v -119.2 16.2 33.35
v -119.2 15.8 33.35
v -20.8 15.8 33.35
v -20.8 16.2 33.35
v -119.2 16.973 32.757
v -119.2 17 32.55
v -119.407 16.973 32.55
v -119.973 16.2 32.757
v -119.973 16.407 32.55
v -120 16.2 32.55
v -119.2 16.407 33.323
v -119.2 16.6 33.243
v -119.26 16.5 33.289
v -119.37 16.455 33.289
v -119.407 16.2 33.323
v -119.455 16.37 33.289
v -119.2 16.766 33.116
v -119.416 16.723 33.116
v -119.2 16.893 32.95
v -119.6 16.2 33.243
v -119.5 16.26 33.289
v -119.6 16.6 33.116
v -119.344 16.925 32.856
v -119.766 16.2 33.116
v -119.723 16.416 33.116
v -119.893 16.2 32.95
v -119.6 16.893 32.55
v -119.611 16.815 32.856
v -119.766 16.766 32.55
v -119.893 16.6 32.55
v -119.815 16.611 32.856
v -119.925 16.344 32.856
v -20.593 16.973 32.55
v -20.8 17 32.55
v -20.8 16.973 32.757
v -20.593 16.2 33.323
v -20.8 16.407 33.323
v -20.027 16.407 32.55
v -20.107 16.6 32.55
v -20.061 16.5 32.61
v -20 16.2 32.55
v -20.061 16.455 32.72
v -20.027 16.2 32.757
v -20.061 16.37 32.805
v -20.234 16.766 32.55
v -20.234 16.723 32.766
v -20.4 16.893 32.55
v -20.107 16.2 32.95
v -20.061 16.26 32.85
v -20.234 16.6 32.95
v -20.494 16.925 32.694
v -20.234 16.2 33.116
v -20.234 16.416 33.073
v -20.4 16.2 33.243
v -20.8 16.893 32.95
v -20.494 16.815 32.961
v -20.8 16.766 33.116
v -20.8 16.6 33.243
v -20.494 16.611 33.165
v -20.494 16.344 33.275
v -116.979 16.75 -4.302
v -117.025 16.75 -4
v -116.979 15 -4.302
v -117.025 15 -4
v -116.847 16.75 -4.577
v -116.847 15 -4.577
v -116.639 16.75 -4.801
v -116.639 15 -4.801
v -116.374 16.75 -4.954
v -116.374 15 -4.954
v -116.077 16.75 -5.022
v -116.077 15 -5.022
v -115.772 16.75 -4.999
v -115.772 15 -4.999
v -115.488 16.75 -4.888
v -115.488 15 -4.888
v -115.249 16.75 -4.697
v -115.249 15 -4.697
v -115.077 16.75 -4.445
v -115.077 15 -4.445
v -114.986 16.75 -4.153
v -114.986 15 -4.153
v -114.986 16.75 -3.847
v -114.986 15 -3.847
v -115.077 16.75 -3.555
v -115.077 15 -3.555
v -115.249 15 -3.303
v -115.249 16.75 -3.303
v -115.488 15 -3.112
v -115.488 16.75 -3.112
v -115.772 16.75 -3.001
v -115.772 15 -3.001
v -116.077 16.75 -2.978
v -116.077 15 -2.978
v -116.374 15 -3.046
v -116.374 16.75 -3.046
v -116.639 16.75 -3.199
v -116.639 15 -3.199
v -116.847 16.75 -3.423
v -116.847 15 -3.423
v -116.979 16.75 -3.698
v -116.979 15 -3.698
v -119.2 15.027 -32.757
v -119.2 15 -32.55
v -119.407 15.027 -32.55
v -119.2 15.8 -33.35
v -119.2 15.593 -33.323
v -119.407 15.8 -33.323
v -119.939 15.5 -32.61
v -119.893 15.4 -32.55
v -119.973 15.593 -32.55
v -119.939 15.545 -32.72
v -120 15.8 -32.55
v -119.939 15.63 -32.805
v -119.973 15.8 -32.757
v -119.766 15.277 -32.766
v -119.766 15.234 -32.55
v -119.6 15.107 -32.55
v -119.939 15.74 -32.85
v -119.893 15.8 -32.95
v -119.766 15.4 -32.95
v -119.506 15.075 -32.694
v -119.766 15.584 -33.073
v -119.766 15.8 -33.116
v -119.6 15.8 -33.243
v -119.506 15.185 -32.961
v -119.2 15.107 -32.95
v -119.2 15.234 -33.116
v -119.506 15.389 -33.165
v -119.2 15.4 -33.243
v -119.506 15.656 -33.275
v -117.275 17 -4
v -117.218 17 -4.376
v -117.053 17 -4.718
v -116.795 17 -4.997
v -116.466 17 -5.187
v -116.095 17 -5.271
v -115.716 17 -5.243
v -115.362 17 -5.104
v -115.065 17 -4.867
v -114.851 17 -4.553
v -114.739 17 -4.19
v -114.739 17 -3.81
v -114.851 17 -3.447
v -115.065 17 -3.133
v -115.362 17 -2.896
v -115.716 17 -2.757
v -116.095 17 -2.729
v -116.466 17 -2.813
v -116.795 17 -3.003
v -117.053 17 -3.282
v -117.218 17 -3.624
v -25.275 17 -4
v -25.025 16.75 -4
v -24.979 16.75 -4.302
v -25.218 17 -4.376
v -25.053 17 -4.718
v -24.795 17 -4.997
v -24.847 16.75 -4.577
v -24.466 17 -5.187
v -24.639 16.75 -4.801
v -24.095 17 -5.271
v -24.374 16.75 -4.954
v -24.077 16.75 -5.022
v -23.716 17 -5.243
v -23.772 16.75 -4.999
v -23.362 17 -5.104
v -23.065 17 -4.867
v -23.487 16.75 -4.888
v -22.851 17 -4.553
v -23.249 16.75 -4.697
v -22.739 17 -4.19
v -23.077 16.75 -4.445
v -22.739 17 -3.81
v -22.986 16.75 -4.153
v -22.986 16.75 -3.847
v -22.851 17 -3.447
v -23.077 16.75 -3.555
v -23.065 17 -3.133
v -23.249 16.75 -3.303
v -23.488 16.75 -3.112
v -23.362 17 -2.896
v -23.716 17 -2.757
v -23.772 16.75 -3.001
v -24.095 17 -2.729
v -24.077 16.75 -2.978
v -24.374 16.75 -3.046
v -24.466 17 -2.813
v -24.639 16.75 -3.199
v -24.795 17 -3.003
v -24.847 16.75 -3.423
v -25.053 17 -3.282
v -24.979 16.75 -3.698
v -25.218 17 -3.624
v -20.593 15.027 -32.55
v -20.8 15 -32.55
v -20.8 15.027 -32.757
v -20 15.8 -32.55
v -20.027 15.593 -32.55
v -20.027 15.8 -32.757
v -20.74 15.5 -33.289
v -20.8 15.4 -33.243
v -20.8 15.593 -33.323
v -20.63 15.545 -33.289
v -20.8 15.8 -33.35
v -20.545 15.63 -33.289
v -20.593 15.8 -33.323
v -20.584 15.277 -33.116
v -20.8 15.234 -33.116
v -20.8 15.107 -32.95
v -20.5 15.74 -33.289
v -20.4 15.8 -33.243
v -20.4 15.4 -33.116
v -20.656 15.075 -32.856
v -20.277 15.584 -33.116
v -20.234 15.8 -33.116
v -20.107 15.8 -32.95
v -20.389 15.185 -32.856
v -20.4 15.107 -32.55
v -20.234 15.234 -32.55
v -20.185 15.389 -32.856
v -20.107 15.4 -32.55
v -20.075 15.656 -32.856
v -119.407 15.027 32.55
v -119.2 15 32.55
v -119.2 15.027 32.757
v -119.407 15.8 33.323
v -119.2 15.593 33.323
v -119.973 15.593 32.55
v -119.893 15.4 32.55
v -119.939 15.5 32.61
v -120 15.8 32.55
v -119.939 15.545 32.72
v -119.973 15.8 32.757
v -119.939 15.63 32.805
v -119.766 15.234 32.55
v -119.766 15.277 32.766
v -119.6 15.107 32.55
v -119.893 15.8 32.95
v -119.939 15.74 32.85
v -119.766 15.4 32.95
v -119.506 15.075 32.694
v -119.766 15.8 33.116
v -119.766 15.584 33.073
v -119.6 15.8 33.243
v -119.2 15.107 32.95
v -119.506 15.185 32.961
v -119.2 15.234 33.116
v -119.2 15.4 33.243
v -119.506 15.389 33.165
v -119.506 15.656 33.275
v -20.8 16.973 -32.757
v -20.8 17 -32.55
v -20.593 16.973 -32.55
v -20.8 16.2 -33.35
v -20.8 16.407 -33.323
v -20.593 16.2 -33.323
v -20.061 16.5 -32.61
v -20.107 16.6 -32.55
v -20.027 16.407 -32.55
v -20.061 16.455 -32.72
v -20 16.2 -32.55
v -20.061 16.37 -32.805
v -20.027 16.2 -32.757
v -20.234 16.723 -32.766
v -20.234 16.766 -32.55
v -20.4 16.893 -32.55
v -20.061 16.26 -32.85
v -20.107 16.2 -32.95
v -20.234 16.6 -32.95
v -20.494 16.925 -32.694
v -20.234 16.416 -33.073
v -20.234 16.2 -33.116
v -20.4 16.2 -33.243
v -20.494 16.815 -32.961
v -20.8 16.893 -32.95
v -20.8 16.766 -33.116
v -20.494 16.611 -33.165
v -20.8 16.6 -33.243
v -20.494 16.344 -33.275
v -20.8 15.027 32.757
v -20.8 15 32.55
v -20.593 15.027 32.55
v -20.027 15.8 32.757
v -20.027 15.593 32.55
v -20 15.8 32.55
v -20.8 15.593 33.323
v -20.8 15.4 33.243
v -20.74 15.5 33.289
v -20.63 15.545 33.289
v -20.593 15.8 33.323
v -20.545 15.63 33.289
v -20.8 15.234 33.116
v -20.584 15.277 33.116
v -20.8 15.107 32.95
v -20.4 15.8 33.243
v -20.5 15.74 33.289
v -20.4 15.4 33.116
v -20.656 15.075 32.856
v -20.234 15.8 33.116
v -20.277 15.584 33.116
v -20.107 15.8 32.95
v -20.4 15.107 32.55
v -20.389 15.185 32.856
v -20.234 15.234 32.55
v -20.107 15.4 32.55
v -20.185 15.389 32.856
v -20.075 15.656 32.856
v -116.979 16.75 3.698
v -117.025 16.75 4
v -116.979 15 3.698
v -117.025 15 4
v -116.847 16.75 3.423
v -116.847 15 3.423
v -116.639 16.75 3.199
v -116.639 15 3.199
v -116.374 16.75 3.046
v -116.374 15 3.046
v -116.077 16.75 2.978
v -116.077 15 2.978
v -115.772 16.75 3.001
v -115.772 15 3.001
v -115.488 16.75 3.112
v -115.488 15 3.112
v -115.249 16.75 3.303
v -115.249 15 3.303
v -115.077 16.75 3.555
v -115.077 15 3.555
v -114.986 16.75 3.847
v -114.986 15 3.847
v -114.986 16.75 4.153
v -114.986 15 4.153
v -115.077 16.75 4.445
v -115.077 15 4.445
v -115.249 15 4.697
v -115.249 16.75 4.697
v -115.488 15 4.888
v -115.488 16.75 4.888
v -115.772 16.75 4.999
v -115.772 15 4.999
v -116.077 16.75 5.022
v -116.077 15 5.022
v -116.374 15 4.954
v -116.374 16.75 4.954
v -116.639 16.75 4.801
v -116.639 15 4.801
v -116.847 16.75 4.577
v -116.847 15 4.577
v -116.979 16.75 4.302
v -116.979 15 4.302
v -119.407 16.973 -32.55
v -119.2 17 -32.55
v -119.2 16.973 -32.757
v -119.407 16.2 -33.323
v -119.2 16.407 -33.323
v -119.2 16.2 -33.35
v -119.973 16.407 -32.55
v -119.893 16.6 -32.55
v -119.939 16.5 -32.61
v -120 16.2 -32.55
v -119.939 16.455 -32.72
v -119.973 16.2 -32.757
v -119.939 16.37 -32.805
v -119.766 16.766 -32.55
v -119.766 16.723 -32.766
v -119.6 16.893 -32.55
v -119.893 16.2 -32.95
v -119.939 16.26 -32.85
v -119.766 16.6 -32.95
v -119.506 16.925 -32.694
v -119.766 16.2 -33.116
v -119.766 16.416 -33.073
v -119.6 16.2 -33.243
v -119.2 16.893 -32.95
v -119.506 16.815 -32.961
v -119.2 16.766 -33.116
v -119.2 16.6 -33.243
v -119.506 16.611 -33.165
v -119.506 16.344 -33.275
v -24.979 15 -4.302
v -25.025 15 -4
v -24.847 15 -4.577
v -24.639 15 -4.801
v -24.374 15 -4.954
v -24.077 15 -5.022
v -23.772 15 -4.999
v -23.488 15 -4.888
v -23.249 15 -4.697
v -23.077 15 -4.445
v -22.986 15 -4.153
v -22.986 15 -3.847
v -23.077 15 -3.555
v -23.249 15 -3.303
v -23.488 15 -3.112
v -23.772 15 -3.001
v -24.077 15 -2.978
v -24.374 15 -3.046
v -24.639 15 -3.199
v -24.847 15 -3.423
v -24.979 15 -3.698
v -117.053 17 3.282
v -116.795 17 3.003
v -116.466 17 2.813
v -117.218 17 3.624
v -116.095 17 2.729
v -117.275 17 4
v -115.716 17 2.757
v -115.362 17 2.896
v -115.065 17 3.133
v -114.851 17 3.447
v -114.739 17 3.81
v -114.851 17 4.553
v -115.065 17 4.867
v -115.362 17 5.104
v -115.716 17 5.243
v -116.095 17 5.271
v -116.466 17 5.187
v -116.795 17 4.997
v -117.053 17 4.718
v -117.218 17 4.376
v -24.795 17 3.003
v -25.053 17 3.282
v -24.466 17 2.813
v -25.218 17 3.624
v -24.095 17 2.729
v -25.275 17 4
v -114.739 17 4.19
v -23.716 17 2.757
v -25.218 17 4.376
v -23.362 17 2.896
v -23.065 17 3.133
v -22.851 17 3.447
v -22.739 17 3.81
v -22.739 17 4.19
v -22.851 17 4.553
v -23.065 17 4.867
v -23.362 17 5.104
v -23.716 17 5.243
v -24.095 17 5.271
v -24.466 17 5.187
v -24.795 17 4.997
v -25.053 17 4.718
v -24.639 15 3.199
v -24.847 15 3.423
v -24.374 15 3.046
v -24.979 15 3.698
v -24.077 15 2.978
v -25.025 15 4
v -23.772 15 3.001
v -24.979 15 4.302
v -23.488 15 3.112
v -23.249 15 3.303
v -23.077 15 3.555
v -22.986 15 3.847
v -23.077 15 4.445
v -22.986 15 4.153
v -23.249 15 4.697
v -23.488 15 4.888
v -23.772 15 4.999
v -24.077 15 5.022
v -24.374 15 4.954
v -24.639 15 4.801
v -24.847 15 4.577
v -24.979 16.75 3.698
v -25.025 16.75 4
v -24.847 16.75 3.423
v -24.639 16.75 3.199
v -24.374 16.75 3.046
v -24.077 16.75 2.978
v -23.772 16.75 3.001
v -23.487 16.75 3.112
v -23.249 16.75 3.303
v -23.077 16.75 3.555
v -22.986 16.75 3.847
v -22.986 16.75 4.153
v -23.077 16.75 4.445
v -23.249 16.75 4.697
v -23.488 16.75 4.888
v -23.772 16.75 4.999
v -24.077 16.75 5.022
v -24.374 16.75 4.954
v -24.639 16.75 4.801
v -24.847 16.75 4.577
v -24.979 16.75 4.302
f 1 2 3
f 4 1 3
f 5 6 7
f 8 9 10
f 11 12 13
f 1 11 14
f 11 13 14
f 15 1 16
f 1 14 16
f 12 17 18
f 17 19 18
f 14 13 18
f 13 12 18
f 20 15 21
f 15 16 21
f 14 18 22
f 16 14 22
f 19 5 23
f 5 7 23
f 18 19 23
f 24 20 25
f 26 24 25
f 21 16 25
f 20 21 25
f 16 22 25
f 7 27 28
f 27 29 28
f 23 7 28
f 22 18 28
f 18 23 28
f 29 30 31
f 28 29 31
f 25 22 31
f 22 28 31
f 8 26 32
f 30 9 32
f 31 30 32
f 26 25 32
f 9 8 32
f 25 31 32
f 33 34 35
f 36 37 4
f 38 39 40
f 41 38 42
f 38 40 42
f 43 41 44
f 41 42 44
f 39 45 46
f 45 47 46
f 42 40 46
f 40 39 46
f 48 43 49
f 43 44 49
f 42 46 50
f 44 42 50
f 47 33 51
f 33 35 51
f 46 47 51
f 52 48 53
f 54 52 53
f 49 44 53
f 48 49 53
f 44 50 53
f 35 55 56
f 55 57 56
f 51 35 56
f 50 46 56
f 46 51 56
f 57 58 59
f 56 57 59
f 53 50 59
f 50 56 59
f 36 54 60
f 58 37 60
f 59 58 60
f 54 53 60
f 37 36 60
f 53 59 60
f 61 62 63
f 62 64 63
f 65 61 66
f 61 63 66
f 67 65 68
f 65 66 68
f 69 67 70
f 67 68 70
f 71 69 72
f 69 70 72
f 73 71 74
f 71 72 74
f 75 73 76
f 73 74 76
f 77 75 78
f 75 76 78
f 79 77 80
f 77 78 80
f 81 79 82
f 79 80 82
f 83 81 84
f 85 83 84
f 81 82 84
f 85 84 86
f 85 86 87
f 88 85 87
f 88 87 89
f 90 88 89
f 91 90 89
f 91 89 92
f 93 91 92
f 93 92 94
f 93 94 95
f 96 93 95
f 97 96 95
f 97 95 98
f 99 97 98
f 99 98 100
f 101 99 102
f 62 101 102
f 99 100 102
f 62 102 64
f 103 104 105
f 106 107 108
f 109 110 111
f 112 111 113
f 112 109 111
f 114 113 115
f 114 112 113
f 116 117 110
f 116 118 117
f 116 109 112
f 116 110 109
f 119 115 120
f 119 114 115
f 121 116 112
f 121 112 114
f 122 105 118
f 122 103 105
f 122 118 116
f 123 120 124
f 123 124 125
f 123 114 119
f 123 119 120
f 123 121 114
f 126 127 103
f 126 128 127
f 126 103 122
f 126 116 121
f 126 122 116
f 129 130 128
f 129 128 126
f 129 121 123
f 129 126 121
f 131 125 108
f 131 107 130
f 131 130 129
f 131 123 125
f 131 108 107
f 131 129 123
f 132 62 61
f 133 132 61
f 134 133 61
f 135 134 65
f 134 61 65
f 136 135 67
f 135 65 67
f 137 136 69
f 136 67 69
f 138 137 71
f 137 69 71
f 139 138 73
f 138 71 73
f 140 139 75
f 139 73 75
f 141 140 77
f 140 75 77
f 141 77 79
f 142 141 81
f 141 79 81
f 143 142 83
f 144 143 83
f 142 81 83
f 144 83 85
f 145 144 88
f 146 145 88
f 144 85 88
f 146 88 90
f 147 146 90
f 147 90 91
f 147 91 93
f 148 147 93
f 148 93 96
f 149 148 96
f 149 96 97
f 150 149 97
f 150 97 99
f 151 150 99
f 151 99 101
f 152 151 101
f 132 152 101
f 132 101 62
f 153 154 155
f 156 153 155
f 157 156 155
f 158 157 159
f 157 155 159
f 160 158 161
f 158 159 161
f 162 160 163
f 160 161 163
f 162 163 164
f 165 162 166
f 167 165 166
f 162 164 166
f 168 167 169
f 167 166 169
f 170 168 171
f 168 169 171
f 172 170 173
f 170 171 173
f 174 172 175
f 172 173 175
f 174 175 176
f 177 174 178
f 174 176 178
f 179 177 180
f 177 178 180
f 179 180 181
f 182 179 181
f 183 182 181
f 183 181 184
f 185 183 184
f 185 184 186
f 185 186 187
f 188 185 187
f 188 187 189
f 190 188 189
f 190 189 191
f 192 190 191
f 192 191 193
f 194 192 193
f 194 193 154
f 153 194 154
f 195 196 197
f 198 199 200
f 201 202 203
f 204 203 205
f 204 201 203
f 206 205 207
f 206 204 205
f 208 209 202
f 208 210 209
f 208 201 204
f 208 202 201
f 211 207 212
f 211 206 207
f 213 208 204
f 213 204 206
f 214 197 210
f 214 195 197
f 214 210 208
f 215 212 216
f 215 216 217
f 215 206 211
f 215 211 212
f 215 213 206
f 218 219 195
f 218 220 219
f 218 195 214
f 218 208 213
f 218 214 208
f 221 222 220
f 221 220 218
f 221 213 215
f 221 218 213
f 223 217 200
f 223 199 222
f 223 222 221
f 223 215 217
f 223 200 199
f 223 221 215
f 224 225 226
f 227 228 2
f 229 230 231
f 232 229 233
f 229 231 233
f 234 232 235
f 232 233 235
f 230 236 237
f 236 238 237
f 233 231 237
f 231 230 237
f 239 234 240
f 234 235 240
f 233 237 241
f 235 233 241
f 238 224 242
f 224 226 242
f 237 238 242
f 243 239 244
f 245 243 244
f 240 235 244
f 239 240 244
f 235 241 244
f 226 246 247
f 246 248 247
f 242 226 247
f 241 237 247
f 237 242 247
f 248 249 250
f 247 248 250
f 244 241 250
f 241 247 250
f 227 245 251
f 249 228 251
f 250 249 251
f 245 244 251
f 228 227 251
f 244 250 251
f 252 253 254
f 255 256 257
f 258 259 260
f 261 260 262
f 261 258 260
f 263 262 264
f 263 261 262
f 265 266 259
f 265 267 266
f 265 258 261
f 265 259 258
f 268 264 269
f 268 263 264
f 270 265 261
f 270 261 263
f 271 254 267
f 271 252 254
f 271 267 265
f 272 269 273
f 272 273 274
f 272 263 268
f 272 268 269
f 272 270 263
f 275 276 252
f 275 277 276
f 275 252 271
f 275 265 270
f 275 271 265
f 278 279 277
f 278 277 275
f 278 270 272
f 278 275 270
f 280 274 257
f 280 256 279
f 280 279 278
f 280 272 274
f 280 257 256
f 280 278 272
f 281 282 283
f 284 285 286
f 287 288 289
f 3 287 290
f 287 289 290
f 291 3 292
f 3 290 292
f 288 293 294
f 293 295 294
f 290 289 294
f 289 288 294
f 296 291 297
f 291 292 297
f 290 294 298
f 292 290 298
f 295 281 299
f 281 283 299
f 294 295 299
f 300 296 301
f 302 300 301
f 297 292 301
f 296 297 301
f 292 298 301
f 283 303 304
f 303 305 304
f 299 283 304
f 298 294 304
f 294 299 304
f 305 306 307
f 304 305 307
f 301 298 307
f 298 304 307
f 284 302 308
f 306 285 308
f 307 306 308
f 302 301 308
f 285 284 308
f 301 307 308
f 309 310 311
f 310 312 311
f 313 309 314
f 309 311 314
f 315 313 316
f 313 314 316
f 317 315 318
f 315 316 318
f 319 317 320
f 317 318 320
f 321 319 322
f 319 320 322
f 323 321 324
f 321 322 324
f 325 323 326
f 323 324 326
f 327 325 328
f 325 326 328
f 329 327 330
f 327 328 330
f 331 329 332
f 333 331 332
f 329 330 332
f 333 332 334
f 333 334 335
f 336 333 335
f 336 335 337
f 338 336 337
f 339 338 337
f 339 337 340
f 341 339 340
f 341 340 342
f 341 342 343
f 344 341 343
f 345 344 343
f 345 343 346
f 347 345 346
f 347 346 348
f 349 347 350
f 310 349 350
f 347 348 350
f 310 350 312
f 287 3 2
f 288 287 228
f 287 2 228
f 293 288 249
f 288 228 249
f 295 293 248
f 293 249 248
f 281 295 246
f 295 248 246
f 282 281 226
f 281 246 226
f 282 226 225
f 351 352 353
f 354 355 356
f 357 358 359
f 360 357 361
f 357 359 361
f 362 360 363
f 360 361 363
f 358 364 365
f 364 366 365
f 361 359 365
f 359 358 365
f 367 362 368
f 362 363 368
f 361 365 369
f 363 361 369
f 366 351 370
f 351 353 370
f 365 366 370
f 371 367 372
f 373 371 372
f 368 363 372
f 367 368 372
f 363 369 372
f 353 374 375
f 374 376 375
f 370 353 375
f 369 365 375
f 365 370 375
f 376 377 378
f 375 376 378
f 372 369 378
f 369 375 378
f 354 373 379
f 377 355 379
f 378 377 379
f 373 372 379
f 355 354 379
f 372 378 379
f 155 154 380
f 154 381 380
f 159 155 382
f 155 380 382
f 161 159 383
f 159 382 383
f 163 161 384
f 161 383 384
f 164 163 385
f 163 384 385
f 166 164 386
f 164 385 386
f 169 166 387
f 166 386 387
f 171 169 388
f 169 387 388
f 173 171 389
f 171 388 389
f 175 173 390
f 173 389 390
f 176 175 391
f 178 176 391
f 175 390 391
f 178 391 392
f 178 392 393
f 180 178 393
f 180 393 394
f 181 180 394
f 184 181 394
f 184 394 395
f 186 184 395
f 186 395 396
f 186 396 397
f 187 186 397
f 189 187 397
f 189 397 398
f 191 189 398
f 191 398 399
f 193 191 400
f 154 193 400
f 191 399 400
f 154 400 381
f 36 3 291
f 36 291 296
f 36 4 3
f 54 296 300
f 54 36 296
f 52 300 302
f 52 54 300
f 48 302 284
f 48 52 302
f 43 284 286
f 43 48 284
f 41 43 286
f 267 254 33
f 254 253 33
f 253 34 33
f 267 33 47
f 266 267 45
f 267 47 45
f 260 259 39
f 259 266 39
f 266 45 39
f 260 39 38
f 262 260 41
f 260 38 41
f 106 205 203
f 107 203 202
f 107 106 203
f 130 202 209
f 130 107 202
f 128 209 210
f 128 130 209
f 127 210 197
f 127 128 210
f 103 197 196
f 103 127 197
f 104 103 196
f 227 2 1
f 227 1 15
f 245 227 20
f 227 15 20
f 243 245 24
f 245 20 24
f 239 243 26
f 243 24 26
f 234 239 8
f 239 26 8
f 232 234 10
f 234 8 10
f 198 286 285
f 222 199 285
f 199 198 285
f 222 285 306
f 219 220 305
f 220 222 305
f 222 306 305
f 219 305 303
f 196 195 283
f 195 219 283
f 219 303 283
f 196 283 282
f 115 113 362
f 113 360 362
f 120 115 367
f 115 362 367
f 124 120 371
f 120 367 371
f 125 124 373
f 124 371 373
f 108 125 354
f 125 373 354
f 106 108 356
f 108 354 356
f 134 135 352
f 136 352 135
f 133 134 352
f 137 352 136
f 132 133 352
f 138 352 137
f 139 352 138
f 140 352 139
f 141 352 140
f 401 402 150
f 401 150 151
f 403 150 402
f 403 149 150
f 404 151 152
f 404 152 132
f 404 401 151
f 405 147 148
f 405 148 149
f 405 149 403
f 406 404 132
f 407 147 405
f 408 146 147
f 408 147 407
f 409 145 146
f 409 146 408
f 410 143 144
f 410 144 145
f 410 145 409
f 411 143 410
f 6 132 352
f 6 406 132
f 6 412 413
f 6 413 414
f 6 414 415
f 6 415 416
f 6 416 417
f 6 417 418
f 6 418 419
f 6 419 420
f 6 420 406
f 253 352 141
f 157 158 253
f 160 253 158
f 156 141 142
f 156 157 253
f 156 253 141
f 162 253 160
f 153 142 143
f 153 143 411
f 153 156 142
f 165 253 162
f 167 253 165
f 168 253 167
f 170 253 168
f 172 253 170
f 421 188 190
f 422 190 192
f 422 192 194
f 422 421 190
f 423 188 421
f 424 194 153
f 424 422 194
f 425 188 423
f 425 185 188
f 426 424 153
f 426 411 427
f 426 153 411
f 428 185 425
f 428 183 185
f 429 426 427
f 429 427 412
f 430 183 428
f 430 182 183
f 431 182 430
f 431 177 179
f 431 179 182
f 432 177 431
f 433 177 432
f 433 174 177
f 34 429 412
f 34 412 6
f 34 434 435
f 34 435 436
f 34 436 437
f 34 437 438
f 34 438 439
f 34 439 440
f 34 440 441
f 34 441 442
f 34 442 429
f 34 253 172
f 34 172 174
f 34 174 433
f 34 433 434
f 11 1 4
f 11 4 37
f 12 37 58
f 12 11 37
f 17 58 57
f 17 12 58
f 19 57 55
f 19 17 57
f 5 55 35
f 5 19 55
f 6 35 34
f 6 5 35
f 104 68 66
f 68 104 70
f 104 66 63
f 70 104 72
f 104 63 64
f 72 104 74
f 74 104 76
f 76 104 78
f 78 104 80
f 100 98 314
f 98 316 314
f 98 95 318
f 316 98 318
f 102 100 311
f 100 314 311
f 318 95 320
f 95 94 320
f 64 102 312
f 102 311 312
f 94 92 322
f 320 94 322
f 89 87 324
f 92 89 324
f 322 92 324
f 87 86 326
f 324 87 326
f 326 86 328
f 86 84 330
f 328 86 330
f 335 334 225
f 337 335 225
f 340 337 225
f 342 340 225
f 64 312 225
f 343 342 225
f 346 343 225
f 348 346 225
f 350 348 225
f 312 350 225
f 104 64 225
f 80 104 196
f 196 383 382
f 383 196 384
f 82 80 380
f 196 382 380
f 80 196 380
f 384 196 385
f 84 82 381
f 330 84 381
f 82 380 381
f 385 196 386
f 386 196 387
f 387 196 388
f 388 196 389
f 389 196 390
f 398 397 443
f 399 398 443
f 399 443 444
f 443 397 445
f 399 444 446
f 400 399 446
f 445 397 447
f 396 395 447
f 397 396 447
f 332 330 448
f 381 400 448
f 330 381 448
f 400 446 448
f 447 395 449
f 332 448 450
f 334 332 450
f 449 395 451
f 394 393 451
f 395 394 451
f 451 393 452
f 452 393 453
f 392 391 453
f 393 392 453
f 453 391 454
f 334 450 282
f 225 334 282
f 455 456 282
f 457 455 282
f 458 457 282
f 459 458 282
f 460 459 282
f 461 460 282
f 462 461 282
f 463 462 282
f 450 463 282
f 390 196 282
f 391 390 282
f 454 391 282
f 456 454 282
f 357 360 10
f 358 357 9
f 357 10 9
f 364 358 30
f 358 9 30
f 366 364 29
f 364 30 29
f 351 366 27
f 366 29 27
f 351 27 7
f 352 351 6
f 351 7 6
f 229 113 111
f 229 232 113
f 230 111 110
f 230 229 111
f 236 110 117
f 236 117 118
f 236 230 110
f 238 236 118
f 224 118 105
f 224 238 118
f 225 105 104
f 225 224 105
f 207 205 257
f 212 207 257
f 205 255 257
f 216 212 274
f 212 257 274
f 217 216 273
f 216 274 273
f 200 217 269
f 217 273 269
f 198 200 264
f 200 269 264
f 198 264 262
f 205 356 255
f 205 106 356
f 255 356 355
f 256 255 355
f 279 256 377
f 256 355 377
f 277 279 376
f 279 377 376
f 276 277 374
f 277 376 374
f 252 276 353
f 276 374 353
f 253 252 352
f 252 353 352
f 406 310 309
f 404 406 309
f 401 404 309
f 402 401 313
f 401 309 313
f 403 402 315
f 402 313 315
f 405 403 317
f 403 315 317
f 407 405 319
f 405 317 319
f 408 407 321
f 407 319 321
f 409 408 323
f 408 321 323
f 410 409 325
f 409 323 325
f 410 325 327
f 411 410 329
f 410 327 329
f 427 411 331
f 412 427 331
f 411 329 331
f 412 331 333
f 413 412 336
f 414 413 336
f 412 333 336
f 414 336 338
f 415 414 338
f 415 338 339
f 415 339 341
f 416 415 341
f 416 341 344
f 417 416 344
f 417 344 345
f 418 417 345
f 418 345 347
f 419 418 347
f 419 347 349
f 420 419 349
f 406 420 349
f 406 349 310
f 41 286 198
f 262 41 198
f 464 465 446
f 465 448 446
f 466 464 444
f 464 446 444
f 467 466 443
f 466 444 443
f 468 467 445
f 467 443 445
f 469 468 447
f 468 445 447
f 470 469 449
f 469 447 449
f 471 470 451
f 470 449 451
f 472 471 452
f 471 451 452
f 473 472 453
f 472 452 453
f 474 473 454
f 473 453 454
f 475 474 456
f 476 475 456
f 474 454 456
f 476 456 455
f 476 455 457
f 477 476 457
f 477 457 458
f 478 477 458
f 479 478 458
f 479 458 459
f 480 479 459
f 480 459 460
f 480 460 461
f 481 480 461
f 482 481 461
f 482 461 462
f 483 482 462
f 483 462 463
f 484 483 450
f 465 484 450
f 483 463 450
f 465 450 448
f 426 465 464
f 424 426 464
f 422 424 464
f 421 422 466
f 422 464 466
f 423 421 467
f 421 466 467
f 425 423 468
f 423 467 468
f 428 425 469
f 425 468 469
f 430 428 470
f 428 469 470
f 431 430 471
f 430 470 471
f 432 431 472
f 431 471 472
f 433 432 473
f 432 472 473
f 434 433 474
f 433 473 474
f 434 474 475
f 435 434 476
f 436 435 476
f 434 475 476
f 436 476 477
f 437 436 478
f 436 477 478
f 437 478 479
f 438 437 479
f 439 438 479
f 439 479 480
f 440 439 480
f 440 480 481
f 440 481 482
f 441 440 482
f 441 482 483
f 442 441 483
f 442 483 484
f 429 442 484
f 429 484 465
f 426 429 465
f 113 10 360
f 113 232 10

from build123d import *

# Parameters (mm, degrees)
SKETCH_1_W                     = 40
SKETCH_1_H                     = 66.7
EXTRUDE_1_DEPTH                = 2
SKETCH_2_W                     = 4
SKETCH_2_H                     = 66.7
EXTRUDE_2_DEPTH                = 100
CUT_EXTRUDE_1_DEPTH            = 115.526077816
CUT_EXTRUDE_1_DEPTH_BACK       = 115.526077816
HOLE_WIZARD_M4_1_D             = 3.3
HOLE_WIZARD_M4_1_CSINK_D       = 4.05
HOLE_WIZARD_M4_1_CSINK_ANGLE   = 90
HOLE_WIZARD_M4_2_AT_2_COUNT    = 2
HOLE_WIZARD_M4_2_AT_2_PITCH    = 68.59294731
HOLE_WIZARD_M4_2_AT_3_COUNT    = 2
HOLE_WIZARD_M4_2_AT_3_PITCH    = 26
HOLE_WIZARD_M4_2_AT_4_COUNT    = 2
HOLE_WIZARD_M4_2_AT_4_PITCH    = 62.376998966
HOLE_WIZARD_M4_2_AT_5_COUNT    = 2
HOLE_WIZARD_M4_2_AT_5_PITCH    = 56.7
SKETCH_11_W                    = 66.7
SKETCH_11_H                    = 2
EXTRUDE_3_DEPTH                = 100
SKETCH_13_W                    = 40
SKETCH_13_H                    = 66.7
EXTRUDE_4_DEPTH                = 2
SKETCH_14_W                    = 4
SKETCH_14_H                    = 66.7
EXTRUDE_5_DEPTH                = 100
CUT_EXTRUDE_2_DEPTH            = 180.589037806
CUT_EXTRUDE_2_DEPTH_BACK       = 180.589037806
HOLE_WIZARD_M4_3_AT_2_COUNT    = 2
HOLE_WIZARD_M4_3_AT_2_PITCH    = 26
HOLE_WIZARD_M4_3_AT_3_COUNT    = 2
HOLE_WIZARD_M4_3_AT_3_PITCH    = 62.376998966
HOLE_WIZARD_M4_3_AT_4_COUNT    = 2
HOLE_WIZARD_M4_3_AT_4_PITCH    = 56.7
CUT_EXTRUDE_3_REACH            = 181.589
SKETCH_18_R                    = 9.5
CUT_EXTRUDE_4_REACH            = 181.589
SKETCH_21_R                    = 11
CUT_EXTRUDE_5_REACH            = 181.589
SKETCH_22_R                    = 4.5
FILLET_1_R                     = 2
CUT_EXTRUDE_6_REACH            = 193.604
SKETCH_23_W                    = 36
SKETCH_23_H                    = 66.7
CUT_EXTRUDE_7_REACH            = 164.752
SKETCH_24_W                    = 36
SKETCH_24_H                    = 66.7
HOLE_WIZARD_M3_1_D             = 2.5
HOLE_WIZARD_M3_1_CSINK_D       = 3.05
HOLE_WIZARD_M3_1_CSINK_ANGLE   = 90
CUT_EXTRUDE_8_DEPTH            = 154.990981879
CUT_EXTRUDE_8_DEPTH_BACK       = 154.990981879
SKETCH_27_W                    = 4
SKETCH_27_H                    = 66.7
HOLE_WIZARD_M2_5_1_D           = 2.05
HOLE_WIZARD_M2_5_1_CSINK_D     = 2.55
HOLE_WIZARD_M2_5_1_CSINK_ANGLE = 90
FILLET_2_R                     = 0.8


with BuildPart() as part:
    # Sketch 1 → Extrude 1 (new body)
    with BuildSketch(Plane(origin=(0, 0, 0), x_dir=(1, 0, 0), z_dir=(0, 1, 0))):
        Rectangle(SKETCH_1_W, SKETCH_1_H)
    extrude(amount=EXTRUDE_1_DEPTH)

    # Sketch 2 → Extrude 2 (add)
    with BuildSketch(Plane(origin=(0, 2, 0), x_dir=(1, 0, 0), z_dir=(0, 1, 0))):
        with Locations((-18, 0)):
            Rectangle(SKETCH_2_W, SKETCH_2_H)
    extrude(amount=EXTRUDE_2_DEPTH)

    # Sketch 5 → Cut-Extrude 1 (cut, two sides: drawn at the far end of the back side and taken through both)
    with BuildSketch(Plane.ZY.offset(20).offset(-CUT_EXTRUDE_1_DEPTH_BACK)):
        with BuildLine():
            ThreePointArc((0, 102), (23.582011153, 92.232011153), (33.35, 68.65))
            Line((33.35, 68.65), (33.35, 102))
            Line((33.35, 102), (0, 102))
        make_face()
        with BuildLine():
            ThreePointArc((-33.35, 68.65), (-23.582011153, 92.232011153), (0, 102))
            Line((0, 102), (-33.35, 102))
            Line((-33.35, 102), (-33.35, 68.65))
        make_face()
    extrude(amount=CUT_EXTRUDE_1_DEPTH + CUT_EXTRUDE_1_DEPTH_BACK, mode=Mode.SUBTRACT)

    # Hole Wizard M4 _1 (through all)
    with Locations(Plane.ZY.offset(20)):
        with Locations((0, 97.65), (25.11473671, 54.15), (-25.11473671, 54.15)):
            CounterSinkHole(HOLE_WIZARD_M4_1_D / 2, HOLE_WIZARD_M4_1_CSINK_D / 2, counter_sink_angle=HOLE_WIZARD_M4_1_CSINK_ANGLE)

    # Sketch 10 → Hole Wizard M4 _2 (revolve, cut)
    with BuildSketch(Plane(origin=(15, 2, -28.35), x_dir=(0, 0, 1), z_dir=(1, 0, 0))):
        Polygon((0, 0), (0, 2), (1.65, 2), (1.65, 0.375), (2.025, 0), align=None)
    hole_wizard_m4_2 = revolve(axis=Axis((15, 8.35, -28.35), (0, -1, 0)), mode=Mode.SUBTRACT)

    # Hole Wizard M4 _2 at 2: Hole Wizard M4 _2 ×2
    with Locations(*[Vector(-0.9508085645250022, 0, 0.3097790722852413) * (i * HOLE_WIZARD_M4_2_AT_2_PITCH) for i in range(1, HOLE_WIZARD_M4_2_AT_2_COUNT)]):
        add(hole_wizard_m4_2, mode=Mode.SUBTRACT)

    # Hole Wizard M4 _2 at 3: Hole Wizard M4 _2 ×2
    with Locations(*[(-i * HOLE_WIZARD_M4_2_AT_3_PITCH, 0, 0) for i in range(1, HOLE_WIZARD_M4_2_AT_3_COUNT)]):
        add(hole_wizard_m4_2, mode=Mode.SUBTRACT)

    # Hole Wizard M4 _2 at 4: Hole Wizard M4 _2 ×2
    with Locations(*[Vector(-0.4168203092647413, 0, 0.9089889052042635) * (i * HOLE_WIZARD_M4_2_AT_4_PITCH) for i in range(1, HOLE_WIZARD_M4_2_AT_4_COUNT)]):
        add(hole_wizard_m4_2, mode=Mode.SUBTRACT)

    # Hole Wizard M4 _2 at 5: Hole Wizard M4 _2 ×2
    with Locations(*[(0, 0, i * HOLE_WIZARD_M4_2_AT_5_PITCH) for i in range(1, HOLE_WIZARD_M4_2_AT_5_COUNT)]):
        add(hole_wizard_m4_2, mode=Mode.SUBTRACT)

    # Sketch 11 → Extrude 3 (add)
    with BuildSketch(Plane.ZY.offset(20)):
        with Locations((0, 16)):
            Rectangle(SKETCH_11_W, SKETCH_11_H)
    extrude(amount=EXTRUDE_3_DEPTH)



with BuildPart() as body_2:
    # Sketch 13 → Extrude 4 (new body)
    with BuildSketch(Plane(origin=(0, 0, 0), x_dir=(1, 0, 0), z_dir=(0, 1, 0))):
        with Locations((-140, 0)):
            Rectangle(SKETCH_13_W, SKETCH_13_H)
    extrude(amount=EXTRUDE_4_DEPTH)


with BuildPart() as part_1:
    add(part.part)

    add(body_2.part)  # Extrude 5 merges body 2
    # Sketch 14 → Extrude 5 (add)
    with BuildSketch(Plane(origin=(0, 2, 0), x_dir=(1, 0, 0), z_dir=(0, 1, 0))):
        with Locations((-122, 0)):
            Rectangle(SKETCH_14_W, SKETCH_14_H)
    extrude(amount=EXTRUDE_5_DEPTH)

    # Sketch 15 → Cut-Extrude 2 (cut, two sides: drawn at the far end of the back side and taken through both)
    with BuildSketch(Plane.ZY.offset(124).offset(-CUT_EXTRUDE_2_DEPTH_BACK)):
        with BuildLine():
            ThreePointArc((0, 102), (23.582011153, 92.232011153), (33.35, 68.65))
            Line((33.35, 68.65), (33.35, 102))
            Line((33.35, 102), (0, 102))
        make_face()
        with BuildLine():
            ThreePointArc((-33.35, 68.65), (-23.582011153, 92.232011153), (0, 102))
            Line((0, 102), (-33.35, 102))
            Line((-33.35, 102), (-33.35, 68.65))
        make_face()
    extrude(amount=CUT_EXTRUDE_2_DEPTH + CUT_EXTRUDE_2_DEPTH_BACK, mode=Mode.SUBTRACT)

    # Sketch 17 → Hole Wizard M4 _3 (revolve, cut)
    with BuildSketch(Plane(origin=(-129, 2, -28.35), x_dir=(0, 0, 1), z_dir=(1, 0, 0))):
        Polygon((0, 0), (0, 2), (1.65, 2), (1.65, 0.375), (2.025, 0), align=None)
    hole_wizard_m4_3 = revolve(axis=Axis((-129, 8.35, -28.35), (0, -1, 0)), mode=Mode.SUBTRACT)

    # Hole Wizard M4 _3 at 2: Hole Wizard M4 _3 ×2
    with Locations(*[(-i * HOLE_WIZARD_M4_3_AT_2_PITCH, 0, 0) for i in range(1, HOLE_WIZARD_M4_3_AT_2_COUNT)]):
        add(hole_wizard_m4_3, mode=Mode.SUBTRACT)

    # Hole Wizard M4 _3 at 3: Hole Wizard M4 _3 ×2
    with Locations(*[Vector(-0.41682030926474106, 0, 0.9089889052042636) * (i * HOLE_WIZARD_M4_3_AT_3_PITCH) for i in range(1, HOLE_WIZARD_M4_3_AT_3_COUNT)]):
        add(hole_wizard_m4_3, mode=Mode.SUBTRACT)

    # Hole Wizard M4 _3 at 4: Hole Wizard M4 _3 ×2
    with Locations(*[(0, 0, i * HOLE_WIZARD_M4_3_AT_4_PITCH) for i in range(1, HOLE_WIZARD_M4_3_AT_4_COUNT)]):
        add(hole_wizard_m4_3, mode=Mode.SUBTRACT)

    # Sketch 18 → Cut-Extrude 3 (cut, up to next)
    with BuildSketch(Plane.ZY.offset(124), mode=Mode.PRIVATE) as cut_extrude_3_sk1:
        with Locations((0, 68.65)):
            Circle(SKETCH_18_R)
    cut_extrude_3_tool1 = extrude(cut_extrude_3_sk1.sketch, amount=-CUT_EXTRUDE_3_REACH, mode=Mode.PRIVATE) & part_1.part
    add(cut_extrude_3_tool1.solids().sort_by_distance((-124, 68.65, 0))[0], mode=Mode.SUBTRACT)

    # Sketch 21 → Cut-Extrude 4 (cut, up to next)
    with BuildSketch(Plane(origin=(-16, 0, 0), x_dir=(0, 0, -1), z_dir=(1, 0, 0)), mode=Mode.PRIVATE) as cut_extrude_4_sk1:
        with Locations((0, 68.65)):
            Circle(SKETCH_21_R)
    cut_extrude_4_tool1 = extrude(cut_extrude_4_sk1.sketch, amount=-CUT_EXTRUDE_4_REACH, mode=Mode.PRIVATE) & part_1.part
    add(cut_extrude_4_tool1.solids().sort_by_distance((-16, 68.65, 0))[0], mode=Mode.SUBTRACT)

    # Sketch 22 → Cut-Extrude 5 (cut, up to next)
    with BuildSketch(Plane(origin=(-16, 0, 0), x_dir=(0, 0, -1), z_dir=(1, 0, 0)), mode=Mode.PRIVATE) as cut_extrude_5_sk1:
        with Locations((16.670989023, 59.025)):
            Circle(SKETCH_22_R)
    cut_extrude_5_tool1 = extrude(cut_extrude_5_sk1.sketch, amount=-CUT_EXTRUDE_5_REACH, mode=Mode.PRIVATE) & part_1.part
    add(cut_extrude_5_tool1.solids().sort_by_distance((-16, 59.025, -16.670989))[0], mode=Mode.SUBTRACT)

    # Fillet 1
    fillet_1_edges = [part_1.edges().sort_by_distance(p)[0] for p in [
        (-160, 1, -33.35),
        (-160, 1, 33.35),
        (20, 1, 33.35),
        (20, 1, -33.35),
    ]]
    fillet(fillet_1_edges, radius=FILLET_1_R)

    # Sketch 23 → Cut-Extrude 6 (cut, up to next)
    with BuildSketch(Plane(origin=(0, 2, 0), x_dir=(1, 0, 0), z_dir=(0, 1, 0)), mode=Mode.PRIVATE) as cut_extrude_6_sk1:
        with Locations((-142, 0)):
            Rectangle(SKETCH_23_W, SKETCH_23_H)
    cut_extrude_6_tool1 = extrude(cut_extrude_6_sk1.sketch, amount=-CUT_EXTRUDE_6_REACH, mode=Mode.PRIVATE) & part_1.part
    add(cut_extrude_6_tool1.solids().sort_by_distance((-142, 2, 0))[0], mode=Mode.SUBTRACT)

    # Sketch 24 → Cut-Extrude 7 (cut, up to next)
    with BuildSketch(Plane(origin=(0, 2, 0), x_dir=(1, 0, 0), z_dir=(0, 1, 0)), mode=Mode.PRIVATE) as cut_extrude_7_sk1:
        with Locations((2, 0)):
            Rectangle(SKETCH_24_W, SKETCH_24_H)
    cut_extrude_7_tool1 = extrude(cut_extrude_7_sk1.sketch, amount=-CUT_EXTRUDE_7_REACH, mode=Mode.PRIVATE) & part_1.part
    add(cut_extrude_7_tool1.solids().sort_by_distance((2, 2, 0))[0], mode=Mode.SUBTRACT)

    # Hole Wizard M3 _1 (through all)
    with Locations(Plane(origin=(-16, 0, 0), x_dir=(0, 0, -1), z_dir=(1, 0, 0))):
        with Locations((9, 6), (-9, 6)):
            CounterSinkHole(HOLE_WIZARD_M3_1_D / 2, HOLE_WIZARD_M3_1_CSINK_D / 2, counter_sink_angle=HOLE_WIZARD_M3_1_CSINK_ANGLE)

    # Sketch 27 → Cut-Extrude 8 (cut, two sides: drawn at the far end of the back side and taken through both)
    with BuildSketch(Plane(origin=(0, 17, 0), x_dir=(1, 0, 0), z_dir=(0, 1, 0)).offset(-CUT_EXTRUDE_8_DEPTH_BACK)):
        with Locations((-122, 0)):
            Rectangle(SKETCH_27_W, SKETCH_27_H)
        with Locations((-18, 0)):
            Rectangle(SKETCH_27_W, SKETCH_27_H)
    extrude(amount=CUT_EXTRUDE_8_DEPTH + CUT_EXTRUDE_8_DEPTH_BACK, mode=Mode.SUBTRACT)

    # Hole Wizard M2.5 _1 (through all)
    with Locations(Plane(origin=(0, 17, 0), x_dir=(1, 0, 0), z_dir=(0, 1, 0))):
        with Locations((-116, 4), (-116, -4), (-24, 4), (-24, -4)):
            CounterSinkHole(HOLE_WIZARD_M2_5_1_D / 2, HOLE_WIZARD_M2_5_1_CSINK_D / 2, counter_sink_angle=HOLE_WIZARD_M2_5_1_CSINK_ANGLE)

    # Fillet 2
    fillet_2_edges = [part_1.edges().sort_by_distance(p)[0] for p in [
        (-70, 17, -33.35),
        (-20, 15, 0),
        (-70, 15, -33.35),
        (-70, 15, 33.35),
        (-120, 17, 0),
        (-70, 17, 33.35),
        (-120, 15, 0),
        (-20, 17, 0),
        (-120, 16, -33.35),
        (-120, 16, 33.35),
        (-20, 16, -33.35),
        (-20, 16, 33.35),
    ]]
    fillet(fillet_2_edges, radius=FILLET_2_R)


solid = part_1.part
